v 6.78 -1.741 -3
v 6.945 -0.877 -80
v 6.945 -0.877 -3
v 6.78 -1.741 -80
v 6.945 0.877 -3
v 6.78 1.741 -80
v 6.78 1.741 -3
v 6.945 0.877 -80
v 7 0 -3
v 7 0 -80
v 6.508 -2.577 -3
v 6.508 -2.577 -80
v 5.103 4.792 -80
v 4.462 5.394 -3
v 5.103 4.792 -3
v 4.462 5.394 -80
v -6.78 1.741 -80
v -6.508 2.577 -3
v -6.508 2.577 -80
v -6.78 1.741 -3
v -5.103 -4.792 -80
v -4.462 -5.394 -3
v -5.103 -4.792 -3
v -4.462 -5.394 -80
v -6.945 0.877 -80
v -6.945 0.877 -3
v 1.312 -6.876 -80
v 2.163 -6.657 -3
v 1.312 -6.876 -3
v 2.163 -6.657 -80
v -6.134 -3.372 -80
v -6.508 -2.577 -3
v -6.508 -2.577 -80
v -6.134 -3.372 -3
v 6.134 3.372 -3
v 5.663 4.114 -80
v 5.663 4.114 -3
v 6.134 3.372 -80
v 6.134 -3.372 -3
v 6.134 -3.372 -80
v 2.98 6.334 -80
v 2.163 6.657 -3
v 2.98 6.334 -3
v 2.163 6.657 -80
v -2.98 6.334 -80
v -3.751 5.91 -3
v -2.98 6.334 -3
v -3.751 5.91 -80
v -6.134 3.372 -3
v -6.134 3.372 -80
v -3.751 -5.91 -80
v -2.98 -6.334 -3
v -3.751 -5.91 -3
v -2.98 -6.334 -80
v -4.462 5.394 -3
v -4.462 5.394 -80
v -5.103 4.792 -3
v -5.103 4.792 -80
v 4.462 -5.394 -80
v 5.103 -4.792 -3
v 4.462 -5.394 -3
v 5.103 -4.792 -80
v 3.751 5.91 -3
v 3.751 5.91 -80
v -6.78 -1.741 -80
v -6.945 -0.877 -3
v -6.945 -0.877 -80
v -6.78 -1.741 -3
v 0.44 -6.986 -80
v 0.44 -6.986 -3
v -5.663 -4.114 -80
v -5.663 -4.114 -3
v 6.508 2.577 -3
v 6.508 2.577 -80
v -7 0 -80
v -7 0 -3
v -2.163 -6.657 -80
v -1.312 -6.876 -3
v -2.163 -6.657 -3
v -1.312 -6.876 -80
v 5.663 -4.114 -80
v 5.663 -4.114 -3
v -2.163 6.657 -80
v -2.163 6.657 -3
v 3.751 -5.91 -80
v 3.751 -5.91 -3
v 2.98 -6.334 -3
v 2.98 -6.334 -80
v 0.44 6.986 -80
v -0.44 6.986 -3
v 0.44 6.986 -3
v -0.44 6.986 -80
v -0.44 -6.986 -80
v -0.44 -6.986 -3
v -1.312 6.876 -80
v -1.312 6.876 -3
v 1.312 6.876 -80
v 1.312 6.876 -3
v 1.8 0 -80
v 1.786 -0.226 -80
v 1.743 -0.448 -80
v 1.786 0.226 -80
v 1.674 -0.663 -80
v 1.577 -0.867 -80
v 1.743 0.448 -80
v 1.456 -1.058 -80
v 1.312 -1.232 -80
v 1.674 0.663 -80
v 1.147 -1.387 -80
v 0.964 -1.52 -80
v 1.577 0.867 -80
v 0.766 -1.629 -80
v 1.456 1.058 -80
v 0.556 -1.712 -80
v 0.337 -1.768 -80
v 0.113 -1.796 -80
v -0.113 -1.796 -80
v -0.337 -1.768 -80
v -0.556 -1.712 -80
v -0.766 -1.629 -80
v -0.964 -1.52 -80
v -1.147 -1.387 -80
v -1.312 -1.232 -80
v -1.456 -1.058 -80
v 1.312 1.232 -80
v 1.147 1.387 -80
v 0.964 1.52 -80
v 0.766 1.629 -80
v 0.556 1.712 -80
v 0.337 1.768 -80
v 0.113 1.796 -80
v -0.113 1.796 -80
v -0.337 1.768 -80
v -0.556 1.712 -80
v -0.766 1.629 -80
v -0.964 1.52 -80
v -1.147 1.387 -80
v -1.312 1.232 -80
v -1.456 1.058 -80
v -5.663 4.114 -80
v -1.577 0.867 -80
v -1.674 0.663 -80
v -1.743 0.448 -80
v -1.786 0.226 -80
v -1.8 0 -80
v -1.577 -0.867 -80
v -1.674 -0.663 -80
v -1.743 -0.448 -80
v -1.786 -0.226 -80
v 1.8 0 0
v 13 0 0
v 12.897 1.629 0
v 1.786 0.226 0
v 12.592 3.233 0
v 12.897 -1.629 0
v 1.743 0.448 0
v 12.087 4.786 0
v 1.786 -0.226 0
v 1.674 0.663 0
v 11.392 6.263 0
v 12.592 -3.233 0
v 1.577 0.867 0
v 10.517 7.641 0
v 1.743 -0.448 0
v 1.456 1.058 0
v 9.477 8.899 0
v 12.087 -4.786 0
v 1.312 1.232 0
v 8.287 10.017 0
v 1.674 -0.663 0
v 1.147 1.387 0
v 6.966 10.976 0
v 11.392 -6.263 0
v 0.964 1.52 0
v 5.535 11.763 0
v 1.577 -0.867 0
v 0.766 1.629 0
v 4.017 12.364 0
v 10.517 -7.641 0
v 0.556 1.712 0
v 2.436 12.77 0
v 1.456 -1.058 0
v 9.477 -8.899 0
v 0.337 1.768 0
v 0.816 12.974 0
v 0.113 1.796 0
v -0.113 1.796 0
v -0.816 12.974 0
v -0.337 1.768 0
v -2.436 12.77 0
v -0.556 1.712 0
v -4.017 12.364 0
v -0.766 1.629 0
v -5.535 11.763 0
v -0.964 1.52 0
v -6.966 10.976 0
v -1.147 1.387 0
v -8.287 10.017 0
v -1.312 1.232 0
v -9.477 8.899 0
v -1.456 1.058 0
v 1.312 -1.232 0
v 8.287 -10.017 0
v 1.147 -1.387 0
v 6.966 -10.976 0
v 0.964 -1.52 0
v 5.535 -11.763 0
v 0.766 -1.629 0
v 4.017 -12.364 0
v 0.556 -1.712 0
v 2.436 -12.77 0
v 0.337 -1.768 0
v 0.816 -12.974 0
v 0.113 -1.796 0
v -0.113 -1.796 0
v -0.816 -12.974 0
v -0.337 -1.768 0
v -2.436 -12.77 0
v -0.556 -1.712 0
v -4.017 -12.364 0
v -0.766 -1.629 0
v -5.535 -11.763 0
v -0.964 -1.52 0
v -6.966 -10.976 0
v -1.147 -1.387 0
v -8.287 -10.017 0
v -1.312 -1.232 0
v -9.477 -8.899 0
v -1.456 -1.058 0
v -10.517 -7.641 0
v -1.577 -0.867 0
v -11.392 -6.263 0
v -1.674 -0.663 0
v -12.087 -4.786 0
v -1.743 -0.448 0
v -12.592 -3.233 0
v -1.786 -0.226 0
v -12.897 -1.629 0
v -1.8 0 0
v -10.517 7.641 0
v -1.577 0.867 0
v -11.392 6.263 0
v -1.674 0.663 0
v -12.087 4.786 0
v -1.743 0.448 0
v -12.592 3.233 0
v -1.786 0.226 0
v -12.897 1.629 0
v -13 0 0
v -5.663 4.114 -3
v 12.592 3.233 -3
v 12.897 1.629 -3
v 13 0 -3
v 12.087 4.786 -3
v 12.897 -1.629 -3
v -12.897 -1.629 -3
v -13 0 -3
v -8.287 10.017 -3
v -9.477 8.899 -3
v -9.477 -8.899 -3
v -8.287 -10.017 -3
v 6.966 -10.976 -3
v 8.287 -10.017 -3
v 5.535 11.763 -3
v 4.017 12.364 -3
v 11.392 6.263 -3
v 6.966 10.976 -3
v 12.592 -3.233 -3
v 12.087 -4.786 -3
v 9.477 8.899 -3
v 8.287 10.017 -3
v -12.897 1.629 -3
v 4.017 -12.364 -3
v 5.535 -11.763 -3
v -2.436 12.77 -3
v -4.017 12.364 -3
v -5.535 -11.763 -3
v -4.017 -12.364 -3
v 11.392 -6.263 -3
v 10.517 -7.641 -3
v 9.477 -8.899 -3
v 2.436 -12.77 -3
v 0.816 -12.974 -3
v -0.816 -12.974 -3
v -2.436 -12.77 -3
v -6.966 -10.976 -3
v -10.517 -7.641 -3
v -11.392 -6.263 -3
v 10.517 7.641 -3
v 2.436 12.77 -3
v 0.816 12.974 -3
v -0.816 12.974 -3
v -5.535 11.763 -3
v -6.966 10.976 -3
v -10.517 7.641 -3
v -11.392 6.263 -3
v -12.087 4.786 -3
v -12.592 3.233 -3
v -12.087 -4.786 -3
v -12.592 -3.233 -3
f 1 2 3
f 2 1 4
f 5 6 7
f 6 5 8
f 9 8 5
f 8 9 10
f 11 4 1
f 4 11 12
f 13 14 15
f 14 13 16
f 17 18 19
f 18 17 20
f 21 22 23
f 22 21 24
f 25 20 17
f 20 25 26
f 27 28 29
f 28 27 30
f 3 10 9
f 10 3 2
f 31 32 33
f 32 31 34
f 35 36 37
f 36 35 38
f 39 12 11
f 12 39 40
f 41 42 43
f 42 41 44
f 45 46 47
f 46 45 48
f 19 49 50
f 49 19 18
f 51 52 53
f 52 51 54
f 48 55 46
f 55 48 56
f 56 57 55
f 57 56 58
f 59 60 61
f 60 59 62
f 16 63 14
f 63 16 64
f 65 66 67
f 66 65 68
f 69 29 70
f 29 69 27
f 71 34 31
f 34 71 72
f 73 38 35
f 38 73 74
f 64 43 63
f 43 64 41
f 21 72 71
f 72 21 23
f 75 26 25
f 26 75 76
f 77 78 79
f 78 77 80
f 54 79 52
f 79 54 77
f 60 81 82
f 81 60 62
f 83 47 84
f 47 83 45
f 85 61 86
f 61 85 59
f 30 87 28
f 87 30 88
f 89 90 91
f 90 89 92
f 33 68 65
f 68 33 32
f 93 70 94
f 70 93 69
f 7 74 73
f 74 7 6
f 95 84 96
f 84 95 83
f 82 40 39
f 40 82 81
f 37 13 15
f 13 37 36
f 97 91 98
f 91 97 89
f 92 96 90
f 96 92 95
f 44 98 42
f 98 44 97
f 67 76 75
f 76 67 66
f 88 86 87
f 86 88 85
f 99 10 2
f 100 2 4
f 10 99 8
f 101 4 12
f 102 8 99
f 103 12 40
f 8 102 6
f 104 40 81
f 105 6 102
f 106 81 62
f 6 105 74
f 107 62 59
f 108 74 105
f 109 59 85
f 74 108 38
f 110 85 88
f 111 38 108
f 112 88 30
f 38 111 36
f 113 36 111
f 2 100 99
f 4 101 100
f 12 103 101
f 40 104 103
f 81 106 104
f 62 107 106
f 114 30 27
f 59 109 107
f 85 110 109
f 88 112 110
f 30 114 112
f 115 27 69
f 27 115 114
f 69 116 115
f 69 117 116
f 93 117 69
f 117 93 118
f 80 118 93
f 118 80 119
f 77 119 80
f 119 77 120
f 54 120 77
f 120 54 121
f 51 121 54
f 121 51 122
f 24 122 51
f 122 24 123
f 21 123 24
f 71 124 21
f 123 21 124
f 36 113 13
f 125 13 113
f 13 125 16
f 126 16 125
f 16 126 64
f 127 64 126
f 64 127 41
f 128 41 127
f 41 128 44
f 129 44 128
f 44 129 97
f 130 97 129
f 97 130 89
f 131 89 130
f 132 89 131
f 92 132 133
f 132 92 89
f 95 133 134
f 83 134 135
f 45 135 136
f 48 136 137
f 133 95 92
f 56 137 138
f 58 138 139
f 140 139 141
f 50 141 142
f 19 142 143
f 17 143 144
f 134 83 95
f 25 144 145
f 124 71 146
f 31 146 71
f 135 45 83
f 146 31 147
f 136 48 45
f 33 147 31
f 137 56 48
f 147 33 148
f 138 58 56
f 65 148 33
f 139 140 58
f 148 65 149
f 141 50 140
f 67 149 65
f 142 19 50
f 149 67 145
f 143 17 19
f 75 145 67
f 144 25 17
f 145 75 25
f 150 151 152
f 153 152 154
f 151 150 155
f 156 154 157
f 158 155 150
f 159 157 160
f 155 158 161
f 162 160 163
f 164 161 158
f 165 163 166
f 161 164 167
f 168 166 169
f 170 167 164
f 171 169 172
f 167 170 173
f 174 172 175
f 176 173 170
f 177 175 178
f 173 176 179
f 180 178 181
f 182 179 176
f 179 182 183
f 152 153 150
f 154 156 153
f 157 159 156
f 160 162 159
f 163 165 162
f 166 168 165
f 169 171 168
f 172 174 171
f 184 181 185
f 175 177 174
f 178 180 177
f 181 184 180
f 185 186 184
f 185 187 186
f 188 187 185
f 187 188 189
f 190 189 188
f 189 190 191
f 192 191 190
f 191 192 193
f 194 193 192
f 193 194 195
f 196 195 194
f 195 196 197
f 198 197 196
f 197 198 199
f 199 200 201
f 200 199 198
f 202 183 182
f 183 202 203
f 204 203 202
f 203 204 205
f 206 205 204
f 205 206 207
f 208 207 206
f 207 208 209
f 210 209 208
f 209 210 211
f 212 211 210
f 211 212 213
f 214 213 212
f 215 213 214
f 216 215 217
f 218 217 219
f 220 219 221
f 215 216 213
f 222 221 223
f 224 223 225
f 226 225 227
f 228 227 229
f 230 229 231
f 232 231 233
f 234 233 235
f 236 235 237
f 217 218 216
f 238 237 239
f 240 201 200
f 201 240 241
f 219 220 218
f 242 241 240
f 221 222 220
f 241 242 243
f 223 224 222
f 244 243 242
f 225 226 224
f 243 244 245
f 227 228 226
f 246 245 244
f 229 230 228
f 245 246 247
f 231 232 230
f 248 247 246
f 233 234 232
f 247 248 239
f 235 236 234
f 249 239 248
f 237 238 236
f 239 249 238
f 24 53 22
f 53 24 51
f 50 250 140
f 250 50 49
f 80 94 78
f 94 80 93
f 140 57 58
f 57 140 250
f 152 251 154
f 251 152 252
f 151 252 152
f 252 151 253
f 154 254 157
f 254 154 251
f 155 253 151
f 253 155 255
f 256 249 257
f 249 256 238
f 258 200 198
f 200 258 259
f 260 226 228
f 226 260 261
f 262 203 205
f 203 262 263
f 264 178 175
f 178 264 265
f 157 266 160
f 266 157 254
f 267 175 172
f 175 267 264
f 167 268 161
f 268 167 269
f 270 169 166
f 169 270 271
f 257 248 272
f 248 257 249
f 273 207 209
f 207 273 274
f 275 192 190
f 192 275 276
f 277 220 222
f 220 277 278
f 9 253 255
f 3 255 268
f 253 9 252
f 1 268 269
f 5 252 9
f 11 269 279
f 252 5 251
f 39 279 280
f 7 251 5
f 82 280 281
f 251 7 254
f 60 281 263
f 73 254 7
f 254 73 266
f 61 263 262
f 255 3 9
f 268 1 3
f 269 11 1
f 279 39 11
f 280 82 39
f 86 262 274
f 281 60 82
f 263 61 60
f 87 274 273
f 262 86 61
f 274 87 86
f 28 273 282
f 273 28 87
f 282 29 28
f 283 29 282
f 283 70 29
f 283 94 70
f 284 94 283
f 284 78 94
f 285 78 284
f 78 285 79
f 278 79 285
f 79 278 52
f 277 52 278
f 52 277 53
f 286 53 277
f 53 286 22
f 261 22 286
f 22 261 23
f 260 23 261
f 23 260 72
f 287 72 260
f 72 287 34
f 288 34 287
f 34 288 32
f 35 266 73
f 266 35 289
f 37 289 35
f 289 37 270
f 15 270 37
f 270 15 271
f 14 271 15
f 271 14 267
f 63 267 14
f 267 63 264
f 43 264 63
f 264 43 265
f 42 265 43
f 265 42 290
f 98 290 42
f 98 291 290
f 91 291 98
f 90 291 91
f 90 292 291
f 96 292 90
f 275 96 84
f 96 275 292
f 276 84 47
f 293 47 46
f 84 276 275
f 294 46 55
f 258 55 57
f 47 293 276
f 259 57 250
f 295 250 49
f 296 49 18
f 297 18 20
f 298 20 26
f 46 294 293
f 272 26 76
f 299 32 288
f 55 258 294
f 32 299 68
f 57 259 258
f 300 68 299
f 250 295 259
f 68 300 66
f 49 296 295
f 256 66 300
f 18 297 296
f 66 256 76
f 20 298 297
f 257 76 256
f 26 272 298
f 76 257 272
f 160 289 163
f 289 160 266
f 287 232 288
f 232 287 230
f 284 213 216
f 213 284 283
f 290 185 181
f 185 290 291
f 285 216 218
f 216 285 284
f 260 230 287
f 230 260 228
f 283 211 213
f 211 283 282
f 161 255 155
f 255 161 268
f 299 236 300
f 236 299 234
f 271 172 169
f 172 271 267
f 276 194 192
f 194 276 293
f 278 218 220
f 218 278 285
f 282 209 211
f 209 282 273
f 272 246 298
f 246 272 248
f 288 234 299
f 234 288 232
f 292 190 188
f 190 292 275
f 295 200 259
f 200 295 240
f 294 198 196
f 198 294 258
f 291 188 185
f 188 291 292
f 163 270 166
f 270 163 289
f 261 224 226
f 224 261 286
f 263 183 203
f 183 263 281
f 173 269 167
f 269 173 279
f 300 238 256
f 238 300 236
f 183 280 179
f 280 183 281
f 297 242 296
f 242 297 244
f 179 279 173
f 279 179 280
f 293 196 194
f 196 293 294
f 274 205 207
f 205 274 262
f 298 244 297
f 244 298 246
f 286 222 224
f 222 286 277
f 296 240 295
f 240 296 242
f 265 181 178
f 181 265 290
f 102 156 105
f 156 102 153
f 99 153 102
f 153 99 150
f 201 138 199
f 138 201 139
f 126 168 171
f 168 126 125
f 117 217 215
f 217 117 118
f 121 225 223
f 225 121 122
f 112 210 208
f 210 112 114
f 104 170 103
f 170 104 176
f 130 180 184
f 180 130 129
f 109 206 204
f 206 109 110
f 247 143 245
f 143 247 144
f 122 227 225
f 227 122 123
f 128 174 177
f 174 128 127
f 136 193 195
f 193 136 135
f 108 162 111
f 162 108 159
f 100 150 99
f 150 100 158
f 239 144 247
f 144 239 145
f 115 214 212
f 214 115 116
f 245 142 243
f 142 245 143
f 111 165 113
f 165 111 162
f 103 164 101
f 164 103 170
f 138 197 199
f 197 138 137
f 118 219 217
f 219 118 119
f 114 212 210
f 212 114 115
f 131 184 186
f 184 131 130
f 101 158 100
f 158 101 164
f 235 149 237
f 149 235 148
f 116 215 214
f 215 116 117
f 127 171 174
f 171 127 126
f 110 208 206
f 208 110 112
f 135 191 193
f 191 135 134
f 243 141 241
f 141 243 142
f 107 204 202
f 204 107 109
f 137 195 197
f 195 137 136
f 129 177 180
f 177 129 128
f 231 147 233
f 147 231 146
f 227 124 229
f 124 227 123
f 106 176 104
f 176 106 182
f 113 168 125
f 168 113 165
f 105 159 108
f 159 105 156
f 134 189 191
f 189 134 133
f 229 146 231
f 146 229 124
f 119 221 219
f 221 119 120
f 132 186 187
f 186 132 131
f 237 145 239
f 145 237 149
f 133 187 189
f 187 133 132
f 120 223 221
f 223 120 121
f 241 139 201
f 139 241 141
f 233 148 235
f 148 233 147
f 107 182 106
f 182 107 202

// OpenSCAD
$fn = 50;


difference() {
	union() {
		translate(v = [0, 0, -80.0000000000]) {
			cylinder(h = 80, r = 7.0000000000);
		}
		translate(v = [0, 0, -3.0000000000]) {
			cylinder(h = 3, r = 13.0000000000);
		}
	}
	union() {
		#translate(v = [0, 0, -80]) {
			cylinder(h = 80, r = 1.8000000000);
		}
	}
}
